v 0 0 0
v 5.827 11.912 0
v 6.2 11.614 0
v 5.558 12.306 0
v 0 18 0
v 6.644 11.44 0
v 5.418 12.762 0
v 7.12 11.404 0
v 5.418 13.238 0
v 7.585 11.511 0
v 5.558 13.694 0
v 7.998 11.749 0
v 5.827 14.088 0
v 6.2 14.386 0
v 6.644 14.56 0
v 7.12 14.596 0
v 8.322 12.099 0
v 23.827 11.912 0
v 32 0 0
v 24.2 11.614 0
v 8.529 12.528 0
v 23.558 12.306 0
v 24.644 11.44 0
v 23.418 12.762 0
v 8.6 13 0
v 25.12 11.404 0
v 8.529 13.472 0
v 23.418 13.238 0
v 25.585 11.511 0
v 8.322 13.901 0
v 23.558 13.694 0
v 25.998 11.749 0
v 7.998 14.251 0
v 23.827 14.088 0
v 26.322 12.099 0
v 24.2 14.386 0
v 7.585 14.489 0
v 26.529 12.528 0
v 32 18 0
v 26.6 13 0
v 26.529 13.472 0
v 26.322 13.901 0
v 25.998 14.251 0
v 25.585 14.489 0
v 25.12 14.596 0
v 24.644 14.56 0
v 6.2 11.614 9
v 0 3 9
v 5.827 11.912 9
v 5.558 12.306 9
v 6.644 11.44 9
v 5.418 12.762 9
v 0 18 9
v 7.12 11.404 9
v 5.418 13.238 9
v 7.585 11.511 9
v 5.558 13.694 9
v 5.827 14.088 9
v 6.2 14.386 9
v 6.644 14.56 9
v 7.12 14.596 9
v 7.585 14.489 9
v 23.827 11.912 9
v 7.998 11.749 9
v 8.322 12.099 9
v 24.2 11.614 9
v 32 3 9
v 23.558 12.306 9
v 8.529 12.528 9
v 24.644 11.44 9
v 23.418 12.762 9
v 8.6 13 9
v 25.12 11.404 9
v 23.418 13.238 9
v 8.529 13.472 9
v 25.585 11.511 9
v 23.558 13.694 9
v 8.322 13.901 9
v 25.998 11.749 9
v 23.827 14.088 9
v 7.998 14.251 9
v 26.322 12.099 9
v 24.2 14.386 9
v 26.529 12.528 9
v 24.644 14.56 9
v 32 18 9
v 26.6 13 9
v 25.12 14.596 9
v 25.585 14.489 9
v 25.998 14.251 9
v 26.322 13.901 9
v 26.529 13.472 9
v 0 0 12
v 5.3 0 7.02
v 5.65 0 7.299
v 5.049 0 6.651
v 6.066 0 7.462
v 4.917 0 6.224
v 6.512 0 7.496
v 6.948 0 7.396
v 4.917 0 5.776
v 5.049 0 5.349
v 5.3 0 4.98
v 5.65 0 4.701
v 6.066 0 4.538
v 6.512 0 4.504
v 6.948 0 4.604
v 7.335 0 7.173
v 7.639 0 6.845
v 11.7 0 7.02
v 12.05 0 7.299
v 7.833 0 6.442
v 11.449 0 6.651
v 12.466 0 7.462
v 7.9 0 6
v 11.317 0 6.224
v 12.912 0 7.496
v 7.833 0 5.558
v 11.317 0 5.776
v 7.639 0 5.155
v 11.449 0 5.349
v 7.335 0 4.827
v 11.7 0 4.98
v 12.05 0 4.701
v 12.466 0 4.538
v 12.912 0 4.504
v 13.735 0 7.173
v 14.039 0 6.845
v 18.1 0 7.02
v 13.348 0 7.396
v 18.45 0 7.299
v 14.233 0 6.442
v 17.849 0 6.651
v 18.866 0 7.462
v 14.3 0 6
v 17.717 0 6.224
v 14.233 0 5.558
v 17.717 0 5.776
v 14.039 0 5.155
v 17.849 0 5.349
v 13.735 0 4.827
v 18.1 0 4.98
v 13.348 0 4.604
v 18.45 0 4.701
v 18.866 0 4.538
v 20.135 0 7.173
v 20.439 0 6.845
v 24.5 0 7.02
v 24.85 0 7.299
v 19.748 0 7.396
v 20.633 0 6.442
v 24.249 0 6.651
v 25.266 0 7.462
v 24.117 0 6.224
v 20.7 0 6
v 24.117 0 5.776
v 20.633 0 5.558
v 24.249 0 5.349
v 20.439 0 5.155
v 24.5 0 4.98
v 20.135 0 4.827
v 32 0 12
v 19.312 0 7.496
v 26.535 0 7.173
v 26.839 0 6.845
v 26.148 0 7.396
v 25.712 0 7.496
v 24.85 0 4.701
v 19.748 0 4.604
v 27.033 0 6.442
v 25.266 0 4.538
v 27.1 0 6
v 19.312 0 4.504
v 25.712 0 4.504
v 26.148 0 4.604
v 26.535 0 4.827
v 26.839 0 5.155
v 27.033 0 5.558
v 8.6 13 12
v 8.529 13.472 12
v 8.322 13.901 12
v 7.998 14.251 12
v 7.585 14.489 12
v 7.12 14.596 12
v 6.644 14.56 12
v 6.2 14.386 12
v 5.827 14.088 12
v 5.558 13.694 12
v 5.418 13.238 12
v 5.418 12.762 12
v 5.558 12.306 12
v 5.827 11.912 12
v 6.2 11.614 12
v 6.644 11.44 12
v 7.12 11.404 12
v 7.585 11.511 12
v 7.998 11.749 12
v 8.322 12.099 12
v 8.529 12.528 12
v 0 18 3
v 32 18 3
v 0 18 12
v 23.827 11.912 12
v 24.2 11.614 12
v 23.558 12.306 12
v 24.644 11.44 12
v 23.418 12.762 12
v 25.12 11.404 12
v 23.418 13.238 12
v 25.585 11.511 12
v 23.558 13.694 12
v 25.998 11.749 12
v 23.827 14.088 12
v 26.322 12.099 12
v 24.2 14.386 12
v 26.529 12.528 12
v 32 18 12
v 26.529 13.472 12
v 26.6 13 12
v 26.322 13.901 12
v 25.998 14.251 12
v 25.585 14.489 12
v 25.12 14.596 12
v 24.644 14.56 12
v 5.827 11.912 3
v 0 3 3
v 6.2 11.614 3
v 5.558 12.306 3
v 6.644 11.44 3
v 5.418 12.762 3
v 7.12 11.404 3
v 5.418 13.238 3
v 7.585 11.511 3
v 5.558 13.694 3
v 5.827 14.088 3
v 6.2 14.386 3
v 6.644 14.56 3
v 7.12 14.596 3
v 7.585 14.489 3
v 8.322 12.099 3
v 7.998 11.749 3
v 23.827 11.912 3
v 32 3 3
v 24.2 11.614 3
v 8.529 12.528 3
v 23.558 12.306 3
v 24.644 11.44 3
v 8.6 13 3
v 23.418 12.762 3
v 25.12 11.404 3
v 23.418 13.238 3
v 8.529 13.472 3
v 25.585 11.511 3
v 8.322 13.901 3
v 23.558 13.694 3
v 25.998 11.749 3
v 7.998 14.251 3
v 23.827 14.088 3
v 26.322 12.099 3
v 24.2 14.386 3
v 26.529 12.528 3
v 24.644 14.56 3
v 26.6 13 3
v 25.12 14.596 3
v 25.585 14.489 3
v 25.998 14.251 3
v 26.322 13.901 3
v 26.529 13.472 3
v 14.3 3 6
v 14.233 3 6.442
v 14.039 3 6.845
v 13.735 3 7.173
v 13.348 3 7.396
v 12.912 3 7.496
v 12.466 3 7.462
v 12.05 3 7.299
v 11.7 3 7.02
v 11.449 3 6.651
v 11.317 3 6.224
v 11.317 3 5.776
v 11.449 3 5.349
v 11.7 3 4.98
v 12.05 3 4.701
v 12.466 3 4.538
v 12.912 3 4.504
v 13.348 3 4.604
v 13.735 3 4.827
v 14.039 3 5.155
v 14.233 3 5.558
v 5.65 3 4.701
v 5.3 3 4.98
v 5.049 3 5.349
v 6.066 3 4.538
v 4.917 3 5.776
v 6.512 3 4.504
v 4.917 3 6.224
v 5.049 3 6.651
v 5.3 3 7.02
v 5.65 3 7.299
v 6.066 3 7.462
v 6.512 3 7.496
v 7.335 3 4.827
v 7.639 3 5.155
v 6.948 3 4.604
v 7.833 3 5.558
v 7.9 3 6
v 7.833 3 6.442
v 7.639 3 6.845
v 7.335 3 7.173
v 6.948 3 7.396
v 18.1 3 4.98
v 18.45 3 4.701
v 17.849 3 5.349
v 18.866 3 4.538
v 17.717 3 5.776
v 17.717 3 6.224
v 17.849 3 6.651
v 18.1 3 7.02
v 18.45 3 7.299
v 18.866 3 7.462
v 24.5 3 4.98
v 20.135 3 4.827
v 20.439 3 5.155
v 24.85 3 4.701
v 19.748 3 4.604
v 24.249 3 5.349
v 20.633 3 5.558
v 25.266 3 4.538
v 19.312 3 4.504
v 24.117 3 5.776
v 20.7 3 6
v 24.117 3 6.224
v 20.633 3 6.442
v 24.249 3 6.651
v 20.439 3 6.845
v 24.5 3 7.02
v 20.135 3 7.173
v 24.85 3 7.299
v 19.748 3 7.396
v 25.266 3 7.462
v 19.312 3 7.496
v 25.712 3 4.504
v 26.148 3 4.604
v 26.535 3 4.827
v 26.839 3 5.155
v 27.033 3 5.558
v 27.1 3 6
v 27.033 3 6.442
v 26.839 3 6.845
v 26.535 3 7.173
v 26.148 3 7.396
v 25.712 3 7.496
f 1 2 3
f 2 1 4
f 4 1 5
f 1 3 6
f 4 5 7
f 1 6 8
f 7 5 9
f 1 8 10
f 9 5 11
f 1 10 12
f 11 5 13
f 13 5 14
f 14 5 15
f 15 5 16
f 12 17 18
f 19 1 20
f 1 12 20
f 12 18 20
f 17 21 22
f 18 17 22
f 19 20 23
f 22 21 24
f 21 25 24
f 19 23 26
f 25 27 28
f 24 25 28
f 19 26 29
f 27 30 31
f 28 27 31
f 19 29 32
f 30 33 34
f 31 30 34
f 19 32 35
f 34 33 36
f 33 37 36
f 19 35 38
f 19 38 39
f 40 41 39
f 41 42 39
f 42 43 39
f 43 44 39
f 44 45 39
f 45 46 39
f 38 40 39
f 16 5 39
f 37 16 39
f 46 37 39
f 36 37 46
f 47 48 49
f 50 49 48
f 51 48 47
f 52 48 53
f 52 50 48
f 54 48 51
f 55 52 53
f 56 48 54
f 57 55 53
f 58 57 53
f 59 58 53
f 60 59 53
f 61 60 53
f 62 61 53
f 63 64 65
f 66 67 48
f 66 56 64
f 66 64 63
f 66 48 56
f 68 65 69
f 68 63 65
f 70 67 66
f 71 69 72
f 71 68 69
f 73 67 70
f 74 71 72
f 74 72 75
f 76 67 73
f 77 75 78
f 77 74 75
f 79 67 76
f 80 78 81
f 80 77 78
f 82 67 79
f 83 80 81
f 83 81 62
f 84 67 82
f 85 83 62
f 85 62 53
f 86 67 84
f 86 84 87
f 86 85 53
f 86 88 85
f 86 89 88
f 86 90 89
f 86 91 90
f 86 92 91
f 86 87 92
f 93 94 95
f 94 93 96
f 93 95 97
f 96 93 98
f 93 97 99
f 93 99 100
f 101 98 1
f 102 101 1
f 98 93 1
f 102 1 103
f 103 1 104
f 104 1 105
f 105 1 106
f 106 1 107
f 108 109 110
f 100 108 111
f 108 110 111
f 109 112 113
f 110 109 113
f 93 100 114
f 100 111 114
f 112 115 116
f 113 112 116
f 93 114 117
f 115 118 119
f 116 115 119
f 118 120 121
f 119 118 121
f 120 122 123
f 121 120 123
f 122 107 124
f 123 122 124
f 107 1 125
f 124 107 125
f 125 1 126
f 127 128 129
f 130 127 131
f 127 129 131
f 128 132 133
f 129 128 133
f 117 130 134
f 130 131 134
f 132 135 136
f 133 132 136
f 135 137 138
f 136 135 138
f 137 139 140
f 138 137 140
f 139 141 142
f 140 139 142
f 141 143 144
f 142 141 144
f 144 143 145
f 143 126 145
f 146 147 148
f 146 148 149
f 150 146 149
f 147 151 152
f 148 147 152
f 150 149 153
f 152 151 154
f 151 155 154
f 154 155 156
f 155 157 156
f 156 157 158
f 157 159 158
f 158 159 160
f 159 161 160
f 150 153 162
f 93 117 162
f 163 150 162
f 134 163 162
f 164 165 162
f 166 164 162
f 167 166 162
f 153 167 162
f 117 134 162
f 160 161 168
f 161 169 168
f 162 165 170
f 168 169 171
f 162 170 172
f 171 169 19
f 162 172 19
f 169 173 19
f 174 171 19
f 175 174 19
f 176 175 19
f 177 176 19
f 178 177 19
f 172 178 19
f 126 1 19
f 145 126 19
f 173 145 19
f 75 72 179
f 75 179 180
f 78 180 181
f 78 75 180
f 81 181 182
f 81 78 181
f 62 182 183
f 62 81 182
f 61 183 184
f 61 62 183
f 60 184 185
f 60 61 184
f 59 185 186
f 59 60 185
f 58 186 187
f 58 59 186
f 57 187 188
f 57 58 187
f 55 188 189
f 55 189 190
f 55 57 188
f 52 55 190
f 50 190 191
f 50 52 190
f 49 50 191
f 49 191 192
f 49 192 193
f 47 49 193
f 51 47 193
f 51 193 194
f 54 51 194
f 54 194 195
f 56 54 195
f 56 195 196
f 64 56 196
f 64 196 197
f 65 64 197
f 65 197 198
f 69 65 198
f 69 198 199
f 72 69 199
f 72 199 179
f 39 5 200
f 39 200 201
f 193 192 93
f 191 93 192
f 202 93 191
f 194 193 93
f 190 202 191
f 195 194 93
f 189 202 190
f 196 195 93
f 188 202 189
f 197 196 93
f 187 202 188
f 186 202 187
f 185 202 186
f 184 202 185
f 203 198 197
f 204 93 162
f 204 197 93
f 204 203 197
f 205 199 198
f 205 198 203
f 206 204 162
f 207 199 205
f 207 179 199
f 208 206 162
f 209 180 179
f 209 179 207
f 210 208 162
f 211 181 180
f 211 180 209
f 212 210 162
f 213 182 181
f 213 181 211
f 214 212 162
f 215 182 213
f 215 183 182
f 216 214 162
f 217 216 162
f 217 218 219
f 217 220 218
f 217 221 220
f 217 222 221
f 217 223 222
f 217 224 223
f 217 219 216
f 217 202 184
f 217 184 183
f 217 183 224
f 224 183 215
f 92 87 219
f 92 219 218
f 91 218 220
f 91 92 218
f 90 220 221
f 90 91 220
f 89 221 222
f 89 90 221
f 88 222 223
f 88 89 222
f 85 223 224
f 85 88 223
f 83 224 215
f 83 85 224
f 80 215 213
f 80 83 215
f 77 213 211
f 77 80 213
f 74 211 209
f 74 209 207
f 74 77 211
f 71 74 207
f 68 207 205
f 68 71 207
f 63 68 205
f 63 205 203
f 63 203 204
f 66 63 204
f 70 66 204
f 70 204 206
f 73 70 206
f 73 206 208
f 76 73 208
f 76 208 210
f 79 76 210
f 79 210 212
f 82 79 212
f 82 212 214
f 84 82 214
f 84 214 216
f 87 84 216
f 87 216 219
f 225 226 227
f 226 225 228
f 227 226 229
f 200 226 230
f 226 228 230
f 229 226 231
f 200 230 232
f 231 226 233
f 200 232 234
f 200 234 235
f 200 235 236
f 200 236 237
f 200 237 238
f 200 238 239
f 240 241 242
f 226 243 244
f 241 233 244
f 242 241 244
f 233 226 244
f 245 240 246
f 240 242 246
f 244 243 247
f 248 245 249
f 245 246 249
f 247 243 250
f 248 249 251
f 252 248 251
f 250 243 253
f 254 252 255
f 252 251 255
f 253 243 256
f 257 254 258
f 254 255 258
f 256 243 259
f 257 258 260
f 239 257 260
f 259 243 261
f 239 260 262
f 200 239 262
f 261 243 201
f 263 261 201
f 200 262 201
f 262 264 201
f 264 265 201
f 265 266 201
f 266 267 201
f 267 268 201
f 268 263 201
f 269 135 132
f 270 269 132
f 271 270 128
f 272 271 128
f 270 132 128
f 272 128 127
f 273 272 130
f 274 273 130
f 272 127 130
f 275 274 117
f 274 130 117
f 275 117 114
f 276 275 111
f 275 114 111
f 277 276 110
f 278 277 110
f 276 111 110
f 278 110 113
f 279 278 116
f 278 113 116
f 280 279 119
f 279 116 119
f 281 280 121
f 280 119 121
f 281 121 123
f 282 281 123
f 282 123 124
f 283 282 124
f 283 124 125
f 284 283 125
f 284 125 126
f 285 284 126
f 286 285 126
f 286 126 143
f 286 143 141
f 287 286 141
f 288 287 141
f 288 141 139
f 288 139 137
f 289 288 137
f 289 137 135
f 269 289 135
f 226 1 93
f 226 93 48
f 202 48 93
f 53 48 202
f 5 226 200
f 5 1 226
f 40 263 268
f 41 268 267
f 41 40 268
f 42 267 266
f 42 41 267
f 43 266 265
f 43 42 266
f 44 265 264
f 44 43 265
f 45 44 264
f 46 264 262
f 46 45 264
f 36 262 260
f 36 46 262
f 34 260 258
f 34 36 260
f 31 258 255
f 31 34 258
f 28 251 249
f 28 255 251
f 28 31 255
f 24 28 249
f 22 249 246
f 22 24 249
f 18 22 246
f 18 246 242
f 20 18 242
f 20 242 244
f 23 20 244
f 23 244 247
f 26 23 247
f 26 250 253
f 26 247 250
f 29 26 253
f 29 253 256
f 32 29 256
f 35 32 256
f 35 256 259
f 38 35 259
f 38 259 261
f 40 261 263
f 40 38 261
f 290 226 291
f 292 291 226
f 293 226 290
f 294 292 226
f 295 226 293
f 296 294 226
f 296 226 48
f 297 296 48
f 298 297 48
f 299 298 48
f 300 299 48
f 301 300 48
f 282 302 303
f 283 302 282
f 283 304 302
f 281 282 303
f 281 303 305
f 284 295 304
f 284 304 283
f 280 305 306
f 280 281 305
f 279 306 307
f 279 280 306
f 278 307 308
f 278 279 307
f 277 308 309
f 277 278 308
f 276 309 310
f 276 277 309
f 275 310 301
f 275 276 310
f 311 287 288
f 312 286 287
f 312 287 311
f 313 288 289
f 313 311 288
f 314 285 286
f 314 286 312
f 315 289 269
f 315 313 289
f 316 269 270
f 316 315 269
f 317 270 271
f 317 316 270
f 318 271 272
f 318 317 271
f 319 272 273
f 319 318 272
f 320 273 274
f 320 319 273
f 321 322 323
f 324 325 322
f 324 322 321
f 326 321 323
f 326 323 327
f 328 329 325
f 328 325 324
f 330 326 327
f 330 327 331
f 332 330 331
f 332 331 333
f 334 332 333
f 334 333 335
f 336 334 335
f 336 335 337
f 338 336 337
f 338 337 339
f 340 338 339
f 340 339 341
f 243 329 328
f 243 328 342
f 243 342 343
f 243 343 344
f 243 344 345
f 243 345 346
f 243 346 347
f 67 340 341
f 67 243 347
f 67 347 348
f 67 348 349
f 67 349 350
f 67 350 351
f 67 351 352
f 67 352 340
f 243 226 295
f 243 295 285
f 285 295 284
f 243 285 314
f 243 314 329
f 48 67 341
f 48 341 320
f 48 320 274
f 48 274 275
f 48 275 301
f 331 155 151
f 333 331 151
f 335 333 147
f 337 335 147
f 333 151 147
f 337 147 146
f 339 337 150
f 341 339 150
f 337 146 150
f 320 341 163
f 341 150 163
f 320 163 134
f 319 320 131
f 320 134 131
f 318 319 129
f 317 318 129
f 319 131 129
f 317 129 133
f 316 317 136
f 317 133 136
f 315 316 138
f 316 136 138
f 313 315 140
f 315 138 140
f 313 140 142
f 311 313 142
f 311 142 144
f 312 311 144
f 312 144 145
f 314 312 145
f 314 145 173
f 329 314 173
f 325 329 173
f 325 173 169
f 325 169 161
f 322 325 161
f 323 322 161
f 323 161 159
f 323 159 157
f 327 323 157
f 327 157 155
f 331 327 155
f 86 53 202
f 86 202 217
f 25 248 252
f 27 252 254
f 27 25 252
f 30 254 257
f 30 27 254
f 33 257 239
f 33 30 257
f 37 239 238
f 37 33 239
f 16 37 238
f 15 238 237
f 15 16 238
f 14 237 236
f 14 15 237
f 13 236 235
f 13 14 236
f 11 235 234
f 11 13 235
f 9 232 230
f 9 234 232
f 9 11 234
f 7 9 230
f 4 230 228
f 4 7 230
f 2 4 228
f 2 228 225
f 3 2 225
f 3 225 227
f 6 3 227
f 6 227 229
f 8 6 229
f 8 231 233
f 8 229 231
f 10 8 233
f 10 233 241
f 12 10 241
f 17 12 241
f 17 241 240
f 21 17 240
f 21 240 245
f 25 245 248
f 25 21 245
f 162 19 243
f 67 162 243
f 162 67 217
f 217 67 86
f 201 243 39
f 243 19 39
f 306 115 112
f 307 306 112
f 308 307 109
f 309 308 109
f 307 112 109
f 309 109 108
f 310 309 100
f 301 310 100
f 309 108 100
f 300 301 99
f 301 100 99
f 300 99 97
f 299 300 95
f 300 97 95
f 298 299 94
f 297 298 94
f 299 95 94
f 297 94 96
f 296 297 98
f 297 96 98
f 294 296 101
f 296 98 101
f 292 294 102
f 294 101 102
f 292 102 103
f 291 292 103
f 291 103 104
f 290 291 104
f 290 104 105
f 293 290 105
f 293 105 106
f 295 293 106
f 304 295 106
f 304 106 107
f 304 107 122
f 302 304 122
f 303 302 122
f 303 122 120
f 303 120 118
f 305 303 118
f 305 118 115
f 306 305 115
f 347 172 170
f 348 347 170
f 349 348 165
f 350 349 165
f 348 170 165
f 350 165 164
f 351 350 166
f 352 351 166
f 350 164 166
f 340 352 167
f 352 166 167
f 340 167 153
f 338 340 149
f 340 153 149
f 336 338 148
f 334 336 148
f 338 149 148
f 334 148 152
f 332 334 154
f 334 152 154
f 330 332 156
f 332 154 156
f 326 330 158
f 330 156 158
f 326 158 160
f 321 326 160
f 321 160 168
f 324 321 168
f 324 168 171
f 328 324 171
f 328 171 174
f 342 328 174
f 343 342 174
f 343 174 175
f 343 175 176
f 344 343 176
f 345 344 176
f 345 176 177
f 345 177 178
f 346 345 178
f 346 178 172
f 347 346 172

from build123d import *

# Parameters (mm, degrees)
SKETCH_W        = 32
SKETCH_H        = 18
SKETCH_R        = 1.6
PAD_DEPTH       = 12
SKETCH001_W     = 15
SKETCH001_H     = 6
POCKET_DEPTH    = 32.001
SKETCH002_R     = 1.5
POCKET001_DEPTH = 18.001


with BuildPart() as part:
    # Sketch → Pad (new body)
    with BuildSketch(Plane.XY):
        with Locations((16, 9)):
            Rectangle(SKETCH_W, SKETCH_H)
        with Locations((7, 13)):
            Circle(SKETCH_R, mode=Mode.SUBTRACT)
        with Locations((25, 13)):
            Circle(SKETCH_R, mode=Mode.SUBTRACT)
    extrude(amount=PAD_DEPTH)

    # Sketch001 → Pocket (cut, through all)
    with BuildSketch(Plane.YZ.offset(32)):
        with Locations((10.5, 6)):
            Rectangle(SKETCH001_W, SKETCH001_H)
    extrude(amount=-POCKET_DEPTH, mode=Mode.SUBTRACT)

    # Sketch002 → Pocket001 (cut, through all)
    with BuildSketch(Plane.XZ):
        with Locations((6.4, 6)):
            Circle(SKETCH002_R)
        with Locations((12.8, 6)):
            Circle(SKETCH002_R)
        with Locations((19.2, 6)):
            Circle(SKETCH002_R)
        with Locations((25.6, 6)):
            Circle(SKETCH002_R)
    extrude(amount=-POCKET001_DEPTH, mode=Mode.SUBTRACT)


solid = part.part
